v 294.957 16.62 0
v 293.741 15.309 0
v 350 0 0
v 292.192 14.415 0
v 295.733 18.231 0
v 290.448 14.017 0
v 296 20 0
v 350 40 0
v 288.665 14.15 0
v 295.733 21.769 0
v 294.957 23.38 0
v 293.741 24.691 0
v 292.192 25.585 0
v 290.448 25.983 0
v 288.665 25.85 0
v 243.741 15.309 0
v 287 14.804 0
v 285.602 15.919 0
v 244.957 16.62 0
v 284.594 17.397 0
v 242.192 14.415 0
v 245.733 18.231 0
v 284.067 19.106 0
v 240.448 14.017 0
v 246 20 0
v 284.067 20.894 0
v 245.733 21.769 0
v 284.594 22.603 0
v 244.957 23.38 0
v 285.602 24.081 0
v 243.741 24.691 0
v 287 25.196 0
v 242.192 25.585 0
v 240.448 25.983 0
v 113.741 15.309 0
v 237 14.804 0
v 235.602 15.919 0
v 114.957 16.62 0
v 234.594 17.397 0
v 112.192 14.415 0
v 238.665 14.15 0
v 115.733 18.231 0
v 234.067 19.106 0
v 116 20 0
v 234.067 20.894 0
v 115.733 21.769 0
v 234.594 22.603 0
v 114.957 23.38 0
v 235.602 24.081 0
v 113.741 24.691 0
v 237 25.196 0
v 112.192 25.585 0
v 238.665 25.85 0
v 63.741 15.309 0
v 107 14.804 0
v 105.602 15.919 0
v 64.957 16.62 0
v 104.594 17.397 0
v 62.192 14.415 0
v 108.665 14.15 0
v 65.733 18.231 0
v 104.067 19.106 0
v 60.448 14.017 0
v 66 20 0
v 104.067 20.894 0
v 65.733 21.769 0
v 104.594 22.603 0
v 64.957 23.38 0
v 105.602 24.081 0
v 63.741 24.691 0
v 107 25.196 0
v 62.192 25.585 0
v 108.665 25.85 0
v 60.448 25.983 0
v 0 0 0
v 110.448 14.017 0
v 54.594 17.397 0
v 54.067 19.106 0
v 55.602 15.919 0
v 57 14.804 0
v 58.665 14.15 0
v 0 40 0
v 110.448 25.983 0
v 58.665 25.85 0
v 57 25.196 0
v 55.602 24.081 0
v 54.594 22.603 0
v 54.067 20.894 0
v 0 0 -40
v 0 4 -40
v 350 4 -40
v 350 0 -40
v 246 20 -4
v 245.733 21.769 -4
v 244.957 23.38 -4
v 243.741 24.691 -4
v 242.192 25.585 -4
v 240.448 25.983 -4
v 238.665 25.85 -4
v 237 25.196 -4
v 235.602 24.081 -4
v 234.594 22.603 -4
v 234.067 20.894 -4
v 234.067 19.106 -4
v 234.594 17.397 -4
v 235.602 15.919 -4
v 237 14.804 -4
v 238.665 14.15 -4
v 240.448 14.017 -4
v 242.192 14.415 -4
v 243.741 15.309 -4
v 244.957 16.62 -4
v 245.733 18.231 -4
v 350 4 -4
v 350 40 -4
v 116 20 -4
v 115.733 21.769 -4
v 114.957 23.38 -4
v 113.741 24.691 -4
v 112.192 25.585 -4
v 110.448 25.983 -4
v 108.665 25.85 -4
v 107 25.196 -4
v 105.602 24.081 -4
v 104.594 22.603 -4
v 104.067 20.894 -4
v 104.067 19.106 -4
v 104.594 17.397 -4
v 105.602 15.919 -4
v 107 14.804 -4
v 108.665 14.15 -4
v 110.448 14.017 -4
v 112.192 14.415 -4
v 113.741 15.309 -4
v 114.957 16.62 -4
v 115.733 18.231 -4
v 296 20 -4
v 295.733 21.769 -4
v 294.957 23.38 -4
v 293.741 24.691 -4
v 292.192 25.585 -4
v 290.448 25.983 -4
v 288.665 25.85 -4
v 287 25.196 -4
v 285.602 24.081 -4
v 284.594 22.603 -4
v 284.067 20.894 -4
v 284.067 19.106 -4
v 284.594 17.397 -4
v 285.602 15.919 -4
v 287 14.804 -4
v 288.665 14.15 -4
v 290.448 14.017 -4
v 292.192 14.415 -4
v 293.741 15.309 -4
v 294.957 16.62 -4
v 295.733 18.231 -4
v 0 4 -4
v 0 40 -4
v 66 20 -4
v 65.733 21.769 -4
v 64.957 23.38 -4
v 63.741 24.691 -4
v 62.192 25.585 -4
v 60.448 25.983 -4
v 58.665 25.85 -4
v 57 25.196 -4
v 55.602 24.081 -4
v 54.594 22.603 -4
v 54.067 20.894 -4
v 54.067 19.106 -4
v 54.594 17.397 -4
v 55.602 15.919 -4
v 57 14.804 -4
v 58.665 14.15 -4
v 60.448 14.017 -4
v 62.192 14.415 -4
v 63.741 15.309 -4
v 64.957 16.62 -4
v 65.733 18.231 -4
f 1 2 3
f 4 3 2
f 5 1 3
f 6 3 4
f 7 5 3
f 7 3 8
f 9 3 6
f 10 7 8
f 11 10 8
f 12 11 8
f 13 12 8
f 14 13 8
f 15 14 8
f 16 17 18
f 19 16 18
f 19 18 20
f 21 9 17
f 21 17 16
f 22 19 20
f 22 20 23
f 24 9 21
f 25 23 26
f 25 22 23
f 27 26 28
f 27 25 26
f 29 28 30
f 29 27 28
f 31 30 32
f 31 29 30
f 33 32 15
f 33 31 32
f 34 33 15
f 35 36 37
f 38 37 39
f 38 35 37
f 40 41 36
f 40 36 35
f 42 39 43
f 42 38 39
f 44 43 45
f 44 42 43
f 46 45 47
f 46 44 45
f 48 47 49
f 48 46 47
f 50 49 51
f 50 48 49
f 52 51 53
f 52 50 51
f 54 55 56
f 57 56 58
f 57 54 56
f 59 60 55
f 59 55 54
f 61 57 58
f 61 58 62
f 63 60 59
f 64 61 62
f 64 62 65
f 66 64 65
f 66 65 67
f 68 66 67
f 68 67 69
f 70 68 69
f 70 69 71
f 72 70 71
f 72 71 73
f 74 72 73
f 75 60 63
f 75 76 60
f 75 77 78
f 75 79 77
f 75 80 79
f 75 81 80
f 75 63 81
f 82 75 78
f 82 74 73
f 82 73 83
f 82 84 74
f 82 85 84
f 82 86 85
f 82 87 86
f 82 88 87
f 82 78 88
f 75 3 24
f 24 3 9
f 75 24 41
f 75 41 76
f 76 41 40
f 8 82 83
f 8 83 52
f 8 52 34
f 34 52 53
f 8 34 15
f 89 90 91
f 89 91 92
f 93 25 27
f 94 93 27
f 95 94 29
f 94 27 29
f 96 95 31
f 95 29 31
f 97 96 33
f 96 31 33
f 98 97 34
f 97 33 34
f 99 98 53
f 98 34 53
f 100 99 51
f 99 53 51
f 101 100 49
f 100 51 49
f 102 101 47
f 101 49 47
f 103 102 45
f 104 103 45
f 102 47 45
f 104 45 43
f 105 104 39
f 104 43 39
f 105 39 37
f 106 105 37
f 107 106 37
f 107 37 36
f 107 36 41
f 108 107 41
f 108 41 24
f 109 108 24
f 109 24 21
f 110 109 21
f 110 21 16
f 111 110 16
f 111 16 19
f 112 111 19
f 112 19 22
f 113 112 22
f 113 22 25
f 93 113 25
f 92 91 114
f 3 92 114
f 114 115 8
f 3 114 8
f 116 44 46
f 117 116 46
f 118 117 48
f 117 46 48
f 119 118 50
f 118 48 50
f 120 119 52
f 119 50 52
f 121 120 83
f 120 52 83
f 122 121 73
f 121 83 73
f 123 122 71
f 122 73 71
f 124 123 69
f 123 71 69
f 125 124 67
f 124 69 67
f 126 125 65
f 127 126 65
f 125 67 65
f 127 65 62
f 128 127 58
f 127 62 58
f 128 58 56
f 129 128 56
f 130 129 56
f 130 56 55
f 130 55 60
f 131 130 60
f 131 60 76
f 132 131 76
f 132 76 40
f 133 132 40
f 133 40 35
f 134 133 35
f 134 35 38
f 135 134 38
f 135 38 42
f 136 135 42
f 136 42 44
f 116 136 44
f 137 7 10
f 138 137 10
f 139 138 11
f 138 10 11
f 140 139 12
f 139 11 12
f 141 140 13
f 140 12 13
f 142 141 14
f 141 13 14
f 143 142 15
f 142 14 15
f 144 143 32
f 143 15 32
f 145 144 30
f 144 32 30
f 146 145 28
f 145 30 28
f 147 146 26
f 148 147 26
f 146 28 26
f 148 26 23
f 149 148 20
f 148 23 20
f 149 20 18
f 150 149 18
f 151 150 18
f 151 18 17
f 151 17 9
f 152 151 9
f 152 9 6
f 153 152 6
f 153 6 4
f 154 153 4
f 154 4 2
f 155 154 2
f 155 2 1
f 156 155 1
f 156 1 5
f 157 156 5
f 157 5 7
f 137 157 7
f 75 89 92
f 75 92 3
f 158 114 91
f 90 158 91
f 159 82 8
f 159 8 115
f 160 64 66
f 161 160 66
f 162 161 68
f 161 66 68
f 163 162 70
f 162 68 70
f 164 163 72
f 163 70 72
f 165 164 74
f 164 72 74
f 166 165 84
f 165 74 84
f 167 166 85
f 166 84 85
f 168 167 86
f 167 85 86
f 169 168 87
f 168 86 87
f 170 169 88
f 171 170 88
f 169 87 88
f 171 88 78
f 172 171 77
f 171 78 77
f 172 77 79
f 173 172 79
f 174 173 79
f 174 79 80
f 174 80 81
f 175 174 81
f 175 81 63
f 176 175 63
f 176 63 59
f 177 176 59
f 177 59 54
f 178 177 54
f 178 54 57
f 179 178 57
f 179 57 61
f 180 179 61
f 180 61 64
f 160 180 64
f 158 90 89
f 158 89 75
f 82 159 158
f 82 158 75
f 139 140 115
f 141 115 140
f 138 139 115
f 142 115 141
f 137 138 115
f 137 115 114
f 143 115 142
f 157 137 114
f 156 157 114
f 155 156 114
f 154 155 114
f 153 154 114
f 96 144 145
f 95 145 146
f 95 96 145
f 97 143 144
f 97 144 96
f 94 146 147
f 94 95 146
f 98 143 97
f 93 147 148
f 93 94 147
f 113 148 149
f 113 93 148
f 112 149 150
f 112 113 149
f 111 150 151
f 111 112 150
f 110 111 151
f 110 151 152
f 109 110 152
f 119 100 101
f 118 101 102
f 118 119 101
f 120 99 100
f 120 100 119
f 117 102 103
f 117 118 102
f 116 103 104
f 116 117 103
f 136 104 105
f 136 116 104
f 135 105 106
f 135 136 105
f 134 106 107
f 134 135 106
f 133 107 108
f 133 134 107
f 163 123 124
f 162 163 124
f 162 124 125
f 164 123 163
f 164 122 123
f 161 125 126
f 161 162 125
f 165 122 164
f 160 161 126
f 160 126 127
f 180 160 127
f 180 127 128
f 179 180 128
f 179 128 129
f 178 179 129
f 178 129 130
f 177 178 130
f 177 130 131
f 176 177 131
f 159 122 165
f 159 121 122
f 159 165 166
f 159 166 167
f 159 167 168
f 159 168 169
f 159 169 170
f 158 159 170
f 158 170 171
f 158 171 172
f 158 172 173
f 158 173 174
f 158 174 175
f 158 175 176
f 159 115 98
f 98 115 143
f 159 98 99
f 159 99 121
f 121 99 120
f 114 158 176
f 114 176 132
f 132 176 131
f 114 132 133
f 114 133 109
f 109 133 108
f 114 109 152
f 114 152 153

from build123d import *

# Parameters (mm, degrees)
EXTRUDE_1_DEPTH     = 350
SKETCH_2_R          = 6
CUT_EXTRUDE_1_DEPTH = 355.541958025
SKETCH_3_R          = 6
CUT_EXTRUDE_2_DEPTH = 355.541958025
SKETCH_4_R          = 6
CUT_EXTRUDE_3_DEPTH = 355.541958025
SKETCH_6_R          = 6
CUT_EXTRUDE_4_DEPTH = 355.541958025


with BuildPart() as part:
    # Эскиз1 → Бобышка-Вытянуть1 (new body)
    with BuildSketch(Plane(origin=(0, 0, 0), x_dir=(0, 0, -1), z_dir=(1, 0, 0))):
        Polygon((0, 0), (0, 40), (4, 40), (4, 4), (40, 4), (40, 0), align=None)
    extrude(amount=EXTRUDE_1_DEPTH)

    # Эскиз2 → Вырез-Вытянуть1 (cut, through all)
    with BuildSketch(Plane.XY):
        with Locations((60, 20)):
            Circle(SKETCH_2_R)
    extrude(amount=-CUT_EXTRUDE_1_DEPTH, mode=Mode.SUBTRACT)

    # Эскиз3 → Вырез-Вытянуть2 (cut, through all)
    with BuildSketch(Plane.XY):
        with Locations((290, 20)):
            Circle(SKETCH_3_R)
    extrude(amount=-CUT_EXTRUDE_2_DEPTH, mode=Mode.SUBTRACT)

    # Эскиз4 → Вырез-Вытянуть3 (cut, through all)
    with BuildSketch(Plane.XY):
        with Locations((240, 20)):
            Circle(SKETCH_4_R)
    extrude(amount=-CUT_EXTRUDE_3_DEPTH, mode=Mode.SUBTRACT)

    # Эскиз6 → Вырез-Вытянуть4 (cut, through all)
    with BuildSketch(Plane.XY):
        with Locations((110, 20)):
            Circle(SKETCH_6_R)
    extrude(amount=-CUT_EXTRUDE_4_DEPTH, mode=Mode.SUBTRACT)


solid = part.part
